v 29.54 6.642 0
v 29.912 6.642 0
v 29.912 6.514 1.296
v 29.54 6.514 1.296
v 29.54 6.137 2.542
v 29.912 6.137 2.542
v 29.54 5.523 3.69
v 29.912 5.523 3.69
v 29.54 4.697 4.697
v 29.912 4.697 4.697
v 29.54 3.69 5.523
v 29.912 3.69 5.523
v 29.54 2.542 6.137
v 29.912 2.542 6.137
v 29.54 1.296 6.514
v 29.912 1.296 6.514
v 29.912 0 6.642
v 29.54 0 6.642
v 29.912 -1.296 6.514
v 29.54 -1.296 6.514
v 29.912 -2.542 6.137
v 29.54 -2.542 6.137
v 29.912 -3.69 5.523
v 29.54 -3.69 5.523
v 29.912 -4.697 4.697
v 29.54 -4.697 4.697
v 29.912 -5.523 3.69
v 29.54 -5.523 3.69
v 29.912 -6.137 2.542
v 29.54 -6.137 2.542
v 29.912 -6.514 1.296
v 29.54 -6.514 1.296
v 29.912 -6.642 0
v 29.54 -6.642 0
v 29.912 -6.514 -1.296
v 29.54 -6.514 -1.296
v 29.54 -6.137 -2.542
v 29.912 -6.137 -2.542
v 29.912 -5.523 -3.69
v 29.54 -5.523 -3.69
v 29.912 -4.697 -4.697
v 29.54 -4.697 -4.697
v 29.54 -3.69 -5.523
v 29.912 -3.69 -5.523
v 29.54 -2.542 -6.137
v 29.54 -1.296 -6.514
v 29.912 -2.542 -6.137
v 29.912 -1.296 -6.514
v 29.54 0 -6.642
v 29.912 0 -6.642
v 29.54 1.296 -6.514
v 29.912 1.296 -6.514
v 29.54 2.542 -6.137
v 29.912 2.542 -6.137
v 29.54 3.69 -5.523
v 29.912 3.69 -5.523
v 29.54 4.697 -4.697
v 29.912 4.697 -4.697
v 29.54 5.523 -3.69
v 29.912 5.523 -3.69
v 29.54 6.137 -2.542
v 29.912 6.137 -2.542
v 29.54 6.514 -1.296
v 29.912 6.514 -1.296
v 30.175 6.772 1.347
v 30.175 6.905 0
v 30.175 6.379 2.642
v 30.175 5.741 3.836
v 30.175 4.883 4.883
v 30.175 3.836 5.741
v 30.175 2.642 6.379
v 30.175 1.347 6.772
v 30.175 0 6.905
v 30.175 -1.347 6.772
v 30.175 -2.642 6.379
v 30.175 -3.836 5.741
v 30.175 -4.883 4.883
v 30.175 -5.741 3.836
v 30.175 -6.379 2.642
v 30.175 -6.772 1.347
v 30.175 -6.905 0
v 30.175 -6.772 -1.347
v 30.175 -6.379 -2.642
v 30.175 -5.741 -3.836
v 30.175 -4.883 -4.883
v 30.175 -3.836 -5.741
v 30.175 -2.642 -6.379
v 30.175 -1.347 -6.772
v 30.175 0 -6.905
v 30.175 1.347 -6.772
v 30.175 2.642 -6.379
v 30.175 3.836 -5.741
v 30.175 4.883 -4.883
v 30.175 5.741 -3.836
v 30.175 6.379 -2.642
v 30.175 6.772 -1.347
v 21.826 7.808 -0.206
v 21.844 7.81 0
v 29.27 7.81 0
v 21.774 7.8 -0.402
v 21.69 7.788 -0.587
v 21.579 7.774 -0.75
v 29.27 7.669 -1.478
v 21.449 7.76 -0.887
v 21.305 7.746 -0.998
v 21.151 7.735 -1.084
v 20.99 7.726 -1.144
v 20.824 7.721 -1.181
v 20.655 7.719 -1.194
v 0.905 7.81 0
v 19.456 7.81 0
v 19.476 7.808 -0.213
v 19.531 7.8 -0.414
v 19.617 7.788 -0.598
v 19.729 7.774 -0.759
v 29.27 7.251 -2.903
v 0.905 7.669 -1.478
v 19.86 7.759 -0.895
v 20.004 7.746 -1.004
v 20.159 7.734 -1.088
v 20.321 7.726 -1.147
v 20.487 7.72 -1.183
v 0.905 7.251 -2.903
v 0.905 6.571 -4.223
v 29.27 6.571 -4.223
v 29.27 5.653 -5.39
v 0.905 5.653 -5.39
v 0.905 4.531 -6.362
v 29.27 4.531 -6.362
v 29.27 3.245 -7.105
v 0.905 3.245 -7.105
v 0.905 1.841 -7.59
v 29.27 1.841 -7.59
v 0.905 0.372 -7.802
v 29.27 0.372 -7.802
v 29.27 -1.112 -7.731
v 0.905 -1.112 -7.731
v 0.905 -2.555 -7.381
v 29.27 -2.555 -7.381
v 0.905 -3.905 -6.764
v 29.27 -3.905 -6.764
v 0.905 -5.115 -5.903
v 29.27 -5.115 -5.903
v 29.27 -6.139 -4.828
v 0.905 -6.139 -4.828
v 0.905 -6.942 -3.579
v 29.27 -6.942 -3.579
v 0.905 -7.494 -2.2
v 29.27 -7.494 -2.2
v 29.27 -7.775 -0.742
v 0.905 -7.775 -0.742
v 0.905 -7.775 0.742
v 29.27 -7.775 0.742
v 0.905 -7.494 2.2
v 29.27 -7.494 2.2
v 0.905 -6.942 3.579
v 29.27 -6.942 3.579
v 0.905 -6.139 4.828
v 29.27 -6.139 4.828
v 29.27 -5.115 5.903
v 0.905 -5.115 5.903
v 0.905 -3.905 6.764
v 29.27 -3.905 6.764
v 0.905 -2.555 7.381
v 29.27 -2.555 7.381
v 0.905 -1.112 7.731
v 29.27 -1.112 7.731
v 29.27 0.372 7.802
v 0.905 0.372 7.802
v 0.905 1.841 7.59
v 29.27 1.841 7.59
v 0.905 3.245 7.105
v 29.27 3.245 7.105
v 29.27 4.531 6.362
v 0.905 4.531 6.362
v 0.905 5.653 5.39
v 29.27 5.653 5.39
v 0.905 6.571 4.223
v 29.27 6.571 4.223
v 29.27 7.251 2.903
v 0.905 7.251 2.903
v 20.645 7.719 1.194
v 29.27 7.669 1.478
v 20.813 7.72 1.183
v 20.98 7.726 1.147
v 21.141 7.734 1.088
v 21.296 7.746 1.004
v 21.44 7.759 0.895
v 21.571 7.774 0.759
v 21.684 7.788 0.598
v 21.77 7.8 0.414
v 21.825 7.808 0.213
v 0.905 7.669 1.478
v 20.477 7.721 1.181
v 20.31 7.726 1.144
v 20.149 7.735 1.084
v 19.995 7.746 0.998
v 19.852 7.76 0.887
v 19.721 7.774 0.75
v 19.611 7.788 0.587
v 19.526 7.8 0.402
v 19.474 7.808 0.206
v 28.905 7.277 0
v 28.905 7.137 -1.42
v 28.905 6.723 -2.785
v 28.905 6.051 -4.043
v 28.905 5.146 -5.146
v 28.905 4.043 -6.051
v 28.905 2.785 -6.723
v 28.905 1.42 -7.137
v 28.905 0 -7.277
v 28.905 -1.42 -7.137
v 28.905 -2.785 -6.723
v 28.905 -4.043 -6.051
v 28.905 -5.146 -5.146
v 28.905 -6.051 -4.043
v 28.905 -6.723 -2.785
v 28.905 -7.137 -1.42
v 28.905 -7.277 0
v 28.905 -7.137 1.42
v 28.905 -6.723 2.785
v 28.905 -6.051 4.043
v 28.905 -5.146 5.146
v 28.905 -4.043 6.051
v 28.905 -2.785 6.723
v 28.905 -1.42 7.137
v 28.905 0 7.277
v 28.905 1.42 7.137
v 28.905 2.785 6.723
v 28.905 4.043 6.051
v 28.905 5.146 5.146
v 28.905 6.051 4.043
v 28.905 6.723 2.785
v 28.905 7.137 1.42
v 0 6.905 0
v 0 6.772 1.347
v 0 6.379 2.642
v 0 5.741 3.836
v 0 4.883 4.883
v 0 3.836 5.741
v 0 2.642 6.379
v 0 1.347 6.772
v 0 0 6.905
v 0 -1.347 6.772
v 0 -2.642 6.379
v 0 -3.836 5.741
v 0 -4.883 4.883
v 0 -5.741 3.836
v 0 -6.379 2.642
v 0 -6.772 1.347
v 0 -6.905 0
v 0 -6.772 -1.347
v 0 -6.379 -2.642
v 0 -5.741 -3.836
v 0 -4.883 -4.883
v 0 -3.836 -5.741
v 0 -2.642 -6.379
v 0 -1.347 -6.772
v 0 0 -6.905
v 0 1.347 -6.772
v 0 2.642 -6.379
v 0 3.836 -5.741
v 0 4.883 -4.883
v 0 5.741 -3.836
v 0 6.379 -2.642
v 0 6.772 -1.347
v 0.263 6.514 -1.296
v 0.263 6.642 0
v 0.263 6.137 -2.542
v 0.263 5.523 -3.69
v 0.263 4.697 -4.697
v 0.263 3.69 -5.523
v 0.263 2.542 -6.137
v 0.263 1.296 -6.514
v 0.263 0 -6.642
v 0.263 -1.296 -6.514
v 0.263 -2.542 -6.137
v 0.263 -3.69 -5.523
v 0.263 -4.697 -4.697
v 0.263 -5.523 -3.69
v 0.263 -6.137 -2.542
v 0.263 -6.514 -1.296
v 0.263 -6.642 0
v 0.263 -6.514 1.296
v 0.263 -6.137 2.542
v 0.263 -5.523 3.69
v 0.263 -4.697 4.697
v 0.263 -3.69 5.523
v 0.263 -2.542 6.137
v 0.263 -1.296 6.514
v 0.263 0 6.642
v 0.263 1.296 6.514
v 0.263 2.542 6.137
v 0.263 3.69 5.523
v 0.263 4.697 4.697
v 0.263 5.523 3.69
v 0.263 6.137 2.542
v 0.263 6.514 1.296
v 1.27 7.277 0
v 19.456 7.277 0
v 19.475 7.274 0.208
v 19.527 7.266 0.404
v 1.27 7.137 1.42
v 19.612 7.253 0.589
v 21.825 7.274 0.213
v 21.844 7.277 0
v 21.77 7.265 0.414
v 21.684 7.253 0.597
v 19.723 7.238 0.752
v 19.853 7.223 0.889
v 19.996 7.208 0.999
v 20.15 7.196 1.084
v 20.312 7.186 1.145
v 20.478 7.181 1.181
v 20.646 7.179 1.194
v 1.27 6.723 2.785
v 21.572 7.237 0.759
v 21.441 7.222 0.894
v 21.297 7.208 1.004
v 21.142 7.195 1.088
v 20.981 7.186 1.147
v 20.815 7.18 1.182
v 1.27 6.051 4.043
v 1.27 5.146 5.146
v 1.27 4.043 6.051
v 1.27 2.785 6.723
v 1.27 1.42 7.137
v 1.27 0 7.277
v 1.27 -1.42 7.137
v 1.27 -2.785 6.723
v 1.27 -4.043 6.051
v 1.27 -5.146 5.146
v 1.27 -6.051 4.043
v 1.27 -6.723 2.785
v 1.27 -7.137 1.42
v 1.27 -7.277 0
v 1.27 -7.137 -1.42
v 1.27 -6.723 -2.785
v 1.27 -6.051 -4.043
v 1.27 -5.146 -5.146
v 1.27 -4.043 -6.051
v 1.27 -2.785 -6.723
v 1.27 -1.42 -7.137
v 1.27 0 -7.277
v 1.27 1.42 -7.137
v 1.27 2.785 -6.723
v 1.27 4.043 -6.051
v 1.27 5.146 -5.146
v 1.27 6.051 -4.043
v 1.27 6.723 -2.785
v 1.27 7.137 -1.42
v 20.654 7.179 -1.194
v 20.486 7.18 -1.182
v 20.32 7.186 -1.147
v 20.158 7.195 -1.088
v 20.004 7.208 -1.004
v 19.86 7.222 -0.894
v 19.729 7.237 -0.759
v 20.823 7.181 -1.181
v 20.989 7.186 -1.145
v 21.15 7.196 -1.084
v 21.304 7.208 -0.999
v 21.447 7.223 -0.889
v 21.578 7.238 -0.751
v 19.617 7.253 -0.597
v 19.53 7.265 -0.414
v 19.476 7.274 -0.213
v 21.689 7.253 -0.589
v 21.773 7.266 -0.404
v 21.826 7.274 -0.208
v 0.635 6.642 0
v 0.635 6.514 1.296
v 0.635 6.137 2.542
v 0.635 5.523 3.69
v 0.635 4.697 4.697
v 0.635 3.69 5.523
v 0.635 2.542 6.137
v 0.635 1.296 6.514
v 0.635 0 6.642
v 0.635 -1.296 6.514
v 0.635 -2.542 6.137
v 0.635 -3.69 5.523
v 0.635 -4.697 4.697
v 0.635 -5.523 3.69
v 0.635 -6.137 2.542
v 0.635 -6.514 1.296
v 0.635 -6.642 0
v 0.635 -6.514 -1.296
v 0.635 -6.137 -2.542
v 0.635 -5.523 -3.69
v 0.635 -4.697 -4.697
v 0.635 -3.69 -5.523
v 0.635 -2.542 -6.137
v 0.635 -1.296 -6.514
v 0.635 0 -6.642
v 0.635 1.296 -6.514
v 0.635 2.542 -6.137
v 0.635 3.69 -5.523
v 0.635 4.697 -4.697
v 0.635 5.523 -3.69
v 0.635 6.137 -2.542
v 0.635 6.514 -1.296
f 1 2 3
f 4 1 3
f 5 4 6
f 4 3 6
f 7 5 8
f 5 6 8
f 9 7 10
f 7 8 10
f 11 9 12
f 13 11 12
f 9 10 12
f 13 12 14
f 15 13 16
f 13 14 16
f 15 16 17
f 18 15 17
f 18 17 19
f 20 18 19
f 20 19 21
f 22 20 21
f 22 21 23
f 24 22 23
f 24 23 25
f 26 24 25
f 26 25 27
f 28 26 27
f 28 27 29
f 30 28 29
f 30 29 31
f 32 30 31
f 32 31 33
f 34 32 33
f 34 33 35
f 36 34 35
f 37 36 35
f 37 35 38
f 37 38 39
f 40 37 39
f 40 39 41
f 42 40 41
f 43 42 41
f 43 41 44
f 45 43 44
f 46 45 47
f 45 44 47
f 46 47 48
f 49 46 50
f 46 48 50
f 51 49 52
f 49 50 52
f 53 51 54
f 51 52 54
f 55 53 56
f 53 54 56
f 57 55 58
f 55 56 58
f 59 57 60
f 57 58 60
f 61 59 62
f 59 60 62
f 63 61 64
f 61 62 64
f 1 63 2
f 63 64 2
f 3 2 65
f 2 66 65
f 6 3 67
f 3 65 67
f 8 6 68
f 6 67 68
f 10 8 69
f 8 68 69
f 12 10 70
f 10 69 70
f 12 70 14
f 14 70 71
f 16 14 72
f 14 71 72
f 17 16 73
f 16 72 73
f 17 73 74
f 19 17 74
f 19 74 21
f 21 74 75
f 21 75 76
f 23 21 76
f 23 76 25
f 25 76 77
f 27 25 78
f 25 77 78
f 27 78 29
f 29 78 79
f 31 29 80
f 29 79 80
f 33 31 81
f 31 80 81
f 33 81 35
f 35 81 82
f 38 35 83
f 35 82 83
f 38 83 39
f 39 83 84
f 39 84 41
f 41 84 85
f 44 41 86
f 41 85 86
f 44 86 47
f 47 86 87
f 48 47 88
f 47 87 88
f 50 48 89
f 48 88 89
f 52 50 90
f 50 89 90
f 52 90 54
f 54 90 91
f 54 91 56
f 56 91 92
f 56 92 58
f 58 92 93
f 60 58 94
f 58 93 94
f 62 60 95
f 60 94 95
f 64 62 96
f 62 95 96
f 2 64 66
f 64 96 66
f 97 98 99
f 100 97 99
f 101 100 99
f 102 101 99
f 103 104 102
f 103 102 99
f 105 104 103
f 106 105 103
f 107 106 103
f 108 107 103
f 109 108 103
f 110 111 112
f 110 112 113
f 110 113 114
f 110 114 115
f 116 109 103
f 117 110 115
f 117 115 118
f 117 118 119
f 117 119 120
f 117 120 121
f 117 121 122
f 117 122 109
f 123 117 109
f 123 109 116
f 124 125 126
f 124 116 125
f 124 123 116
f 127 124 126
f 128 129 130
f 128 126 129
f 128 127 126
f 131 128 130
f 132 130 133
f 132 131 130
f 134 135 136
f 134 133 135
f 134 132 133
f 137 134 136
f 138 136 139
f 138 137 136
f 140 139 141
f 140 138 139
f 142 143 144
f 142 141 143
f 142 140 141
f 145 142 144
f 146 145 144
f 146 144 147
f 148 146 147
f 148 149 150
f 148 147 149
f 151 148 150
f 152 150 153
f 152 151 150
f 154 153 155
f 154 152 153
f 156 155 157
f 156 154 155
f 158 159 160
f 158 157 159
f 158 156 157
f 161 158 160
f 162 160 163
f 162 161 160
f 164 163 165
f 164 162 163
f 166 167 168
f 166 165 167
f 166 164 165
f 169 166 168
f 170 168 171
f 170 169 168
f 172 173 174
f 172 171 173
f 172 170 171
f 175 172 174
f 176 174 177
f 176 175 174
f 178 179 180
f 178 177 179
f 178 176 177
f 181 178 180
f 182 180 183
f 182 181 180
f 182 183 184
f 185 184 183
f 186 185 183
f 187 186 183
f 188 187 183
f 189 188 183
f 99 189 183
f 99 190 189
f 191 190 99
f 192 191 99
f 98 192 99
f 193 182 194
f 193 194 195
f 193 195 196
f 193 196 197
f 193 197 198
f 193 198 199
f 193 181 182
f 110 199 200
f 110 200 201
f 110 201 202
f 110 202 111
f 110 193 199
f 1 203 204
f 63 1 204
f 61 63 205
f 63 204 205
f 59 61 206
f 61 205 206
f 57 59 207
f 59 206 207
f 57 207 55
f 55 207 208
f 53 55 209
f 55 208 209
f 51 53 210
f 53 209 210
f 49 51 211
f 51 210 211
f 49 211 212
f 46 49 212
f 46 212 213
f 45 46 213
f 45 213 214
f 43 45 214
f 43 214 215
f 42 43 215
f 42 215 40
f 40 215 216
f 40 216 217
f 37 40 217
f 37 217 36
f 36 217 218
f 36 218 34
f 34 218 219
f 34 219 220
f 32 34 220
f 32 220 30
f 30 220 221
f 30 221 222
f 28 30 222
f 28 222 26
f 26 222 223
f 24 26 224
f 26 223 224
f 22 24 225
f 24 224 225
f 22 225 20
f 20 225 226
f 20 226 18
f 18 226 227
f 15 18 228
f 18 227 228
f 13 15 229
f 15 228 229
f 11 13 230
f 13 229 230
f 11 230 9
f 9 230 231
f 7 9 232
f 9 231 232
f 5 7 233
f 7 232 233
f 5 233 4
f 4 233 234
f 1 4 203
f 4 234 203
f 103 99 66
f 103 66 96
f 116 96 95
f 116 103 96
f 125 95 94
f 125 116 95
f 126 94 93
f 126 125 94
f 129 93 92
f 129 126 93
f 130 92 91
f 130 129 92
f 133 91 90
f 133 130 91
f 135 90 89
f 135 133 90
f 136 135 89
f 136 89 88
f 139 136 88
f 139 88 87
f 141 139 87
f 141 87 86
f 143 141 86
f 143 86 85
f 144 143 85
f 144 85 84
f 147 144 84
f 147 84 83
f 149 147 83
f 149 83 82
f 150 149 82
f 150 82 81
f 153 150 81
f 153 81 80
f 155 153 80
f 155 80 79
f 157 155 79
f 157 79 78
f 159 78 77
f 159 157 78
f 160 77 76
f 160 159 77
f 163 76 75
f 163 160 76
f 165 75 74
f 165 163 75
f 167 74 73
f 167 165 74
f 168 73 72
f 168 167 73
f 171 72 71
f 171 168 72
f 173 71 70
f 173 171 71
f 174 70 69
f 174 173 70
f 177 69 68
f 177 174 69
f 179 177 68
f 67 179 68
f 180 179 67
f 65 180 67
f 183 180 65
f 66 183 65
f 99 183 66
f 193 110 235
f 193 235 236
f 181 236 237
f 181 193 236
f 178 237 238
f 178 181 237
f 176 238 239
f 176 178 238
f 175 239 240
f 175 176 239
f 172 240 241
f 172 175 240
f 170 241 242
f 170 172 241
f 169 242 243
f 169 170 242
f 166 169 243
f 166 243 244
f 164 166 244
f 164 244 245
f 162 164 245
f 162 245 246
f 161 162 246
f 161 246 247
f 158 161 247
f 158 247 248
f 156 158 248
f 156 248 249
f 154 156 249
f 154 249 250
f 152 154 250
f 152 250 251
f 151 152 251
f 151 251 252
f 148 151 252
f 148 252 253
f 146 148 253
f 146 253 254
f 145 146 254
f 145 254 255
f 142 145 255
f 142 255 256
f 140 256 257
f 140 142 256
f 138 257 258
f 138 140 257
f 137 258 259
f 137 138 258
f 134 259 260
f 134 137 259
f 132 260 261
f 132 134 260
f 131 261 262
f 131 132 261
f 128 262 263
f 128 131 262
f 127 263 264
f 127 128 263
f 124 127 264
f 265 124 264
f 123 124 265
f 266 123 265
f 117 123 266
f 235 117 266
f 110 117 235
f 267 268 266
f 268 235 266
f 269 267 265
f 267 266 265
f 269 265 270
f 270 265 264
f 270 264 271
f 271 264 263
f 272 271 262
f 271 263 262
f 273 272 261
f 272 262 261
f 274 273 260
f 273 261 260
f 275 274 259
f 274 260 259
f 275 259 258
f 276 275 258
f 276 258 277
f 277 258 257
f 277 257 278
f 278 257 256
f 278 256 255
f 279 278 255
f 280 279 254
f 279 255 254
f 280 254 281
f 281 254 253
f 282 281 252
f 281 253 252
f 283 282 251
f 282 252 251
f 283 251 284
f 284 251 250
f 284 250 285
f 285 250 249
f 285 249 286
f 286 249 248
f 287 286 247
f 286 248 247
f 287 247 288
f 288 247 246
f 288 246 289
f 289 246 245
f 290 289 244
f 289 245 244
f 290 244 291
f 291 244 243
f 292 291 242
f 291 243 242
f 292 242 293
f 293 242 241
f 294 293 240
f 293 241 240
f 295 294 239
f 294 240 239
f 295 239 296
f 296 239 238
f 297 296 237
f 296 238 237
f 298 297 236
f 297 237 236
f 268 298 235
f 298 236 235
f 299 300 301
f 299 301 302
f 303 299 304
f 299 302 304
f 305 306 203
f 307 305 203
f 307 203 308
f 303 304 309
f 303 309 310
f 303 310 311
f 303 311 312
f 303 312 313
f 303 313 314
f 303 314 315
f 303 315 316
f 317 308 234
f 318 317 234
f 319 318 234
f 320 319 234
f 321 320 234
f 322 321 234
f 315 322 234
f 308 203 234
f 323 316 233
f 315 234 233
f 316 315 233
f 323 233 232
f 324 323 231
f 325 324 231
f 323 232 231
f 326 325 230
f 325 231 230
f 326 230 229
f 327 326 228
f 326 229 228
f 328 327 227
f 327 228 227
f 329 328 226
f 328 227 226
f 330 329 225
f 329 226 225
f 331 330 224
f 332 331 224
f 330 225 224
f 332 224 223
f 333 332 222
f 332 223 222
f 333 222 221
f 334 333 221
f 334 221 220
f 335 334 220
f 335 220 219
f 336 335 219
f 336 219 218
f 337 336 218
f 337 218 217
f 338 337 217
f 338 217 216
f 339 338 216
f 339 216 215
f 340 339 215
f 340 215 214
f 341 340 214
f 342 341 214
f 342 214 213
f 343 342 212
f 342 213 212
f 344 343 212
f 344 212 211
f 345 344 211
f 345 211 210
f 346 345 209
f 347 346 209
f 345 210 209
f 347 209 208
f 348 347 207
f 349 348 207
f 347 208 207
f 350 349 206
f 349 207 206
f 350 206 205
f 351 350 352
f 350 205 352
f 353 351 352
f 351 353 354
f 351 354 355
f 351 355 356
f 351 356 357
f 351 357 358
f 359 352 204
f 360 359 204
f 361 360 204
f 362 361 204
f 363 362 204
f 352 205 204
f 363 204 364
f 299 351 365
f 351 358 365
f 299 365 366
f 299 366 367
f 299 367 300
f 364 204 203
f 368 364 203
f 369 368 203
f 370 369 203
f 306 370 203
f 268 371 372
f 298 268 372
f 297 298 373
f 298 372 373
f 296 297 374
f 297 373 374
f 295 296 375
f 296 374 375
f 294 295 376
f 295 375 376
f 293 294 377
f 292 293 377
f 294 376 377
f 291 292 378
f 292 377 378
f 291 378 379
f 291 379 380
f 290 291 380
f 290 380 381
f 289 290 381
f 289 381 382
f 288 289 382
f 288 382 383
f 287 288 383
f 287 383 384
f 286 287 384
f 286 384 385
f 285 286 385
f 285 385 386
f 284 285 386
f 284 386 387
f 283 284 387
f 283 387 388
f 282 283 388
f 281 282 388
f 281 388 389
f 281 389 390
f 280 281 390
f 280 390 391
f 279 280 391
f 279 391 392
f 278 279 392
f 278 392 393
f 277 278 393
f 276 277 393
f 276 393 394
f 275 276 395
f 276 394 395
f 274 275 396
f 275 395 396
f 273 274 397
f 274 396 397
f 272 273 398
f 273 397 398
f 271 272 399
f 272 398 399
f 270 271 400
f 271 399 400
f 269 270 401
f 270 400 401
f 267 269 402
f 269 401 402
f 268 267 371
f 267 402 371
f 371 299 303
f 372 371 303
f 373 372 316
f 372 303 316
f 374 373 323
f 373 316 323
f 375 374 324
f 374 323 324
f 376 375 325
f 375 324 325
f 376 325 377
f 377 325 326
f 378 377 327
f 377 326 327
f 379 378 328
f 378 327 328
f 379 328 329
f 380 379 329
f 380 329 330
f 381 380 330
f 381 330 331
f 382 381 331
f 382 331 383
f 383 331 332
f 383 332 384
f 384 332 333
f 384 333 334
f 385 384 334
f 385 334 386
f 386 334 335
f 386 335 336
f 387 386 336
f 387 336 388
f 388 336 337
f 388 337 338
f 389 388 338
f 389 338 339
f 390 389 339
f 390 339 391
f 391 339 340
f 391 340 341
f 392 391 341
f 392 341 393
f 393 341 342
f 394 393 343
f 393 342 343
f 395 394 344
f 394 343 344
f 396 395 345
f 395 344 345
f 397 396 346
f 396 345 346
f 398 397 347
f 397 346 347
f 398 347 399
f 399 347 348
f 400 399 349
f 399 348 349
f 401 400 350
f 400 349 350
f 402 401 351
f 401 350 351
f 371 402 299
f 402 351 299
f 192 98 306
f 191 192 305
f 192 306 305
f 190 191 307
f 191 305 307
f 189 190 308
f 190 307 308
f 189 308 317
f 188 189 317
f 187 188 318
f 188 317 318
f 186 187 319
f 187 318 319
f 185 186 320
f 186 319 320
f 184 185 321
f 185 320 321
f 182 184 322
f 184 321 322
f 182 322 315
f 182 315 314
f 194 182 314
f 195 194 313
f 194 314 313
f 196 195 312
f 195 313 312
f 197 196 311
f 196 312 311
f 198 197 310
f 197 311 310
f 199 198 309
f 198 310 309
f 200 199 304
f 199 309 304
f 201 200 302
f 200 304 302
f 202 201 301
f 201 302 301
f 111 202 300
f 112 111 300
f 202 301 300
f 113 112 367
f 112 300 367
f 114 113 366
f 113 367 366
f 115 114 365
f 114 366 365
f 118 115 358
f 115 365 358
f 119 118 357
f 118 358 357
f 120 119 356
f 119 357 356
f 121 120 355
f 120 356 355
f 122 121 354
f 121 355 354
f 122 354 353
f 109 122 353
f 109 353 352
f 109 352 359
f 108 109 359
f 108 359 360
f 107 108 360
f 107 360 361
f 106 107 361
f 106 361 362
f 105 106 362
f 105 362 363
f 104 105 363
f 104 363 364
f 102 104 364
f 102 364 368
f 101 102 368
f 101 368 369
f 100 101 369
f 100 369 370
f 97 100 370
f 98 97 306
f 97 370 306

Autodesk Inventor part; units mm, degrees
sketch "Sketch_5" plane through (0, 0, 0) normal (0, 0, 1) x (1, 0, 0)
  line L0 (30.1752, 0) -> (-30.1752, 0)
  line L1 (0, 6.9051) -> (0.263, 6.6421)
  line L2 (0.263, 6.6421) -> (0.635, 6.6421)
  line L3 (0.635, 6.6421) -> (1.27, 7.2771)
  line L4 (1.27, 7.2771) -> (28.9052, 7.2771)
  line L5 (28.9052, 7.2771) -> (29.5402, 6.6421)
  line L6 (29.5402, 6.6421) -> (29.9122, 6.6421)
  line L7 (29.9122, 6.6421) -> (30.1752, 6.9051)
  line L8 (30.1752, 6.9051) -> (29.2698, 7.8105)
  line L9 (29.2698, 7.8105) -> (0.9054, 7.8105)
  line L10 (0.9054, 7.8105) -> (0, 6.9051)
revolve "Revolution1" add sketch "Sketch_5" angle 360 about axis through (30.1752, 0, 0) along (1, 0, 0)
sketch "Sketch_1" plane through (0, 0, 0) normal (0, 0, 1) x (1, 0, 0)
  line L0 (20.6502, 0) -> (20.6502, 7.8105)
  line L1 (20.6502, 7.8105) -> (21.844, 7.8105)
  line L2 (21.844, 7.8105) -> (21.844, 0)
  line L3 (21.844, 0) -> (20.6502, 0)
  line L4 (20.6502, 0) -> (20.6502, 7.8105)
revolve "Revolution2" cut sketch "Sketch_1" angle 360 about axis through (20.6502, 0, 0) along (0, -1, 0)
ref_plane "o1_XY" through (0, -7.8105, 0) normal (1, 0, 0) x (0, 0, -1)
ref_plane "o1_YZ" through (0, -7.8105, 0) normal (0, 0, -1) x (0, 1, 0)
ref_plane "o1_ZX" through (0, -7.8105, 0) normal (0, 1, 0) x (1, 0, 0)
ref_plane "o2_XY" through (0, 7.8105, 0) normal (1, 0, 0) x (0, 0, -1)
ref_plane "o2_YZ" through (0, 7.8105, 0) normal (0, 0, -1) x (0, 1, 0)
ref_plane "o2_ZX" through (0, 7.8105, 0) normal (0, 1, 0) x (1, 0, 0)
ref_plane "t1_XY" through (15.0876, 7.8105, 0) normal (1, 0, 0) x (0, 0, -1)
ref_plane "t1_YZ" through (15.0876, 7.8105, 0) normal (0, 0, -1) x (0, 1, 0)
ref_plane "t1_ZX" through (15.0876, 7.8105, 0) normal (0, 1, 0) x (1, 0, 0)
ref_plane "t2_XY" through (15.0876, 0, -7.8105) normal (1, 0, 0) x (0, 0, -1)
ref_plane "t2_YZ" through (15.0876, 0, -7.8105) normal (0, 0, -1) x (0, 1, 0)
ref_plane "t2_ZX" through (15.0876, 0, -7.8105) normal (0, 1, 0) x (1, 0, 0)
ref_plane "t3_XY" through (15.0876, -7.8105, 0) normal (1, 0, 0) x (0, 0, -1)
ref_plane "t3_YZ" through (15.0876, -7.8105, 0) normal (0, 0, -1) x (0, 1, 0)
ref_plane "t3_ZX" through (15.0876, -7.8105, 0) normal (0, 1, 0) x (1, 0, 0)
ref_plane "t4_XY" through (15.0876, 0, 7.8105) normal (1, 0, 0) x (0, 0, -1)
ref_plane "t4_YZ" through (15.0876, 0, 7.8105) normal (0, 0, -1) x (0, 1, 0)
ref_plane "t4_ZX" through (15.0876, 0, 7.8105) normal (0, 1, 0) x (1, 0, 0)
ref_plane "tube1_XY" through (1.27, 0, 0) normal (1, 0, 0) x (0, 0, -1)
ref_plane "tube1_YZ" through (1.27, 0, 0) normal (0, 0, -1) x (0, 1, 0)
ref_plane "tube1_ZX" through (1.27, 0, 0) normal (0, 1, 0) x (1, 0, 0)
ref_plane "tube2_XY" through (28.9052, 0, 0) normal (1, 0, 0) x (0, 0, -1)
ref_plane "tube2_YZ" through (28.9052, 0, 0) normal (0, 0, -1) x (0, 1, 0)
ref_plane "tube2_ZX" through (28.9052, 0, 0) normal (0, 1, 0) x (1, 0, 0)
properties part number "D-75938XP-1.188"
